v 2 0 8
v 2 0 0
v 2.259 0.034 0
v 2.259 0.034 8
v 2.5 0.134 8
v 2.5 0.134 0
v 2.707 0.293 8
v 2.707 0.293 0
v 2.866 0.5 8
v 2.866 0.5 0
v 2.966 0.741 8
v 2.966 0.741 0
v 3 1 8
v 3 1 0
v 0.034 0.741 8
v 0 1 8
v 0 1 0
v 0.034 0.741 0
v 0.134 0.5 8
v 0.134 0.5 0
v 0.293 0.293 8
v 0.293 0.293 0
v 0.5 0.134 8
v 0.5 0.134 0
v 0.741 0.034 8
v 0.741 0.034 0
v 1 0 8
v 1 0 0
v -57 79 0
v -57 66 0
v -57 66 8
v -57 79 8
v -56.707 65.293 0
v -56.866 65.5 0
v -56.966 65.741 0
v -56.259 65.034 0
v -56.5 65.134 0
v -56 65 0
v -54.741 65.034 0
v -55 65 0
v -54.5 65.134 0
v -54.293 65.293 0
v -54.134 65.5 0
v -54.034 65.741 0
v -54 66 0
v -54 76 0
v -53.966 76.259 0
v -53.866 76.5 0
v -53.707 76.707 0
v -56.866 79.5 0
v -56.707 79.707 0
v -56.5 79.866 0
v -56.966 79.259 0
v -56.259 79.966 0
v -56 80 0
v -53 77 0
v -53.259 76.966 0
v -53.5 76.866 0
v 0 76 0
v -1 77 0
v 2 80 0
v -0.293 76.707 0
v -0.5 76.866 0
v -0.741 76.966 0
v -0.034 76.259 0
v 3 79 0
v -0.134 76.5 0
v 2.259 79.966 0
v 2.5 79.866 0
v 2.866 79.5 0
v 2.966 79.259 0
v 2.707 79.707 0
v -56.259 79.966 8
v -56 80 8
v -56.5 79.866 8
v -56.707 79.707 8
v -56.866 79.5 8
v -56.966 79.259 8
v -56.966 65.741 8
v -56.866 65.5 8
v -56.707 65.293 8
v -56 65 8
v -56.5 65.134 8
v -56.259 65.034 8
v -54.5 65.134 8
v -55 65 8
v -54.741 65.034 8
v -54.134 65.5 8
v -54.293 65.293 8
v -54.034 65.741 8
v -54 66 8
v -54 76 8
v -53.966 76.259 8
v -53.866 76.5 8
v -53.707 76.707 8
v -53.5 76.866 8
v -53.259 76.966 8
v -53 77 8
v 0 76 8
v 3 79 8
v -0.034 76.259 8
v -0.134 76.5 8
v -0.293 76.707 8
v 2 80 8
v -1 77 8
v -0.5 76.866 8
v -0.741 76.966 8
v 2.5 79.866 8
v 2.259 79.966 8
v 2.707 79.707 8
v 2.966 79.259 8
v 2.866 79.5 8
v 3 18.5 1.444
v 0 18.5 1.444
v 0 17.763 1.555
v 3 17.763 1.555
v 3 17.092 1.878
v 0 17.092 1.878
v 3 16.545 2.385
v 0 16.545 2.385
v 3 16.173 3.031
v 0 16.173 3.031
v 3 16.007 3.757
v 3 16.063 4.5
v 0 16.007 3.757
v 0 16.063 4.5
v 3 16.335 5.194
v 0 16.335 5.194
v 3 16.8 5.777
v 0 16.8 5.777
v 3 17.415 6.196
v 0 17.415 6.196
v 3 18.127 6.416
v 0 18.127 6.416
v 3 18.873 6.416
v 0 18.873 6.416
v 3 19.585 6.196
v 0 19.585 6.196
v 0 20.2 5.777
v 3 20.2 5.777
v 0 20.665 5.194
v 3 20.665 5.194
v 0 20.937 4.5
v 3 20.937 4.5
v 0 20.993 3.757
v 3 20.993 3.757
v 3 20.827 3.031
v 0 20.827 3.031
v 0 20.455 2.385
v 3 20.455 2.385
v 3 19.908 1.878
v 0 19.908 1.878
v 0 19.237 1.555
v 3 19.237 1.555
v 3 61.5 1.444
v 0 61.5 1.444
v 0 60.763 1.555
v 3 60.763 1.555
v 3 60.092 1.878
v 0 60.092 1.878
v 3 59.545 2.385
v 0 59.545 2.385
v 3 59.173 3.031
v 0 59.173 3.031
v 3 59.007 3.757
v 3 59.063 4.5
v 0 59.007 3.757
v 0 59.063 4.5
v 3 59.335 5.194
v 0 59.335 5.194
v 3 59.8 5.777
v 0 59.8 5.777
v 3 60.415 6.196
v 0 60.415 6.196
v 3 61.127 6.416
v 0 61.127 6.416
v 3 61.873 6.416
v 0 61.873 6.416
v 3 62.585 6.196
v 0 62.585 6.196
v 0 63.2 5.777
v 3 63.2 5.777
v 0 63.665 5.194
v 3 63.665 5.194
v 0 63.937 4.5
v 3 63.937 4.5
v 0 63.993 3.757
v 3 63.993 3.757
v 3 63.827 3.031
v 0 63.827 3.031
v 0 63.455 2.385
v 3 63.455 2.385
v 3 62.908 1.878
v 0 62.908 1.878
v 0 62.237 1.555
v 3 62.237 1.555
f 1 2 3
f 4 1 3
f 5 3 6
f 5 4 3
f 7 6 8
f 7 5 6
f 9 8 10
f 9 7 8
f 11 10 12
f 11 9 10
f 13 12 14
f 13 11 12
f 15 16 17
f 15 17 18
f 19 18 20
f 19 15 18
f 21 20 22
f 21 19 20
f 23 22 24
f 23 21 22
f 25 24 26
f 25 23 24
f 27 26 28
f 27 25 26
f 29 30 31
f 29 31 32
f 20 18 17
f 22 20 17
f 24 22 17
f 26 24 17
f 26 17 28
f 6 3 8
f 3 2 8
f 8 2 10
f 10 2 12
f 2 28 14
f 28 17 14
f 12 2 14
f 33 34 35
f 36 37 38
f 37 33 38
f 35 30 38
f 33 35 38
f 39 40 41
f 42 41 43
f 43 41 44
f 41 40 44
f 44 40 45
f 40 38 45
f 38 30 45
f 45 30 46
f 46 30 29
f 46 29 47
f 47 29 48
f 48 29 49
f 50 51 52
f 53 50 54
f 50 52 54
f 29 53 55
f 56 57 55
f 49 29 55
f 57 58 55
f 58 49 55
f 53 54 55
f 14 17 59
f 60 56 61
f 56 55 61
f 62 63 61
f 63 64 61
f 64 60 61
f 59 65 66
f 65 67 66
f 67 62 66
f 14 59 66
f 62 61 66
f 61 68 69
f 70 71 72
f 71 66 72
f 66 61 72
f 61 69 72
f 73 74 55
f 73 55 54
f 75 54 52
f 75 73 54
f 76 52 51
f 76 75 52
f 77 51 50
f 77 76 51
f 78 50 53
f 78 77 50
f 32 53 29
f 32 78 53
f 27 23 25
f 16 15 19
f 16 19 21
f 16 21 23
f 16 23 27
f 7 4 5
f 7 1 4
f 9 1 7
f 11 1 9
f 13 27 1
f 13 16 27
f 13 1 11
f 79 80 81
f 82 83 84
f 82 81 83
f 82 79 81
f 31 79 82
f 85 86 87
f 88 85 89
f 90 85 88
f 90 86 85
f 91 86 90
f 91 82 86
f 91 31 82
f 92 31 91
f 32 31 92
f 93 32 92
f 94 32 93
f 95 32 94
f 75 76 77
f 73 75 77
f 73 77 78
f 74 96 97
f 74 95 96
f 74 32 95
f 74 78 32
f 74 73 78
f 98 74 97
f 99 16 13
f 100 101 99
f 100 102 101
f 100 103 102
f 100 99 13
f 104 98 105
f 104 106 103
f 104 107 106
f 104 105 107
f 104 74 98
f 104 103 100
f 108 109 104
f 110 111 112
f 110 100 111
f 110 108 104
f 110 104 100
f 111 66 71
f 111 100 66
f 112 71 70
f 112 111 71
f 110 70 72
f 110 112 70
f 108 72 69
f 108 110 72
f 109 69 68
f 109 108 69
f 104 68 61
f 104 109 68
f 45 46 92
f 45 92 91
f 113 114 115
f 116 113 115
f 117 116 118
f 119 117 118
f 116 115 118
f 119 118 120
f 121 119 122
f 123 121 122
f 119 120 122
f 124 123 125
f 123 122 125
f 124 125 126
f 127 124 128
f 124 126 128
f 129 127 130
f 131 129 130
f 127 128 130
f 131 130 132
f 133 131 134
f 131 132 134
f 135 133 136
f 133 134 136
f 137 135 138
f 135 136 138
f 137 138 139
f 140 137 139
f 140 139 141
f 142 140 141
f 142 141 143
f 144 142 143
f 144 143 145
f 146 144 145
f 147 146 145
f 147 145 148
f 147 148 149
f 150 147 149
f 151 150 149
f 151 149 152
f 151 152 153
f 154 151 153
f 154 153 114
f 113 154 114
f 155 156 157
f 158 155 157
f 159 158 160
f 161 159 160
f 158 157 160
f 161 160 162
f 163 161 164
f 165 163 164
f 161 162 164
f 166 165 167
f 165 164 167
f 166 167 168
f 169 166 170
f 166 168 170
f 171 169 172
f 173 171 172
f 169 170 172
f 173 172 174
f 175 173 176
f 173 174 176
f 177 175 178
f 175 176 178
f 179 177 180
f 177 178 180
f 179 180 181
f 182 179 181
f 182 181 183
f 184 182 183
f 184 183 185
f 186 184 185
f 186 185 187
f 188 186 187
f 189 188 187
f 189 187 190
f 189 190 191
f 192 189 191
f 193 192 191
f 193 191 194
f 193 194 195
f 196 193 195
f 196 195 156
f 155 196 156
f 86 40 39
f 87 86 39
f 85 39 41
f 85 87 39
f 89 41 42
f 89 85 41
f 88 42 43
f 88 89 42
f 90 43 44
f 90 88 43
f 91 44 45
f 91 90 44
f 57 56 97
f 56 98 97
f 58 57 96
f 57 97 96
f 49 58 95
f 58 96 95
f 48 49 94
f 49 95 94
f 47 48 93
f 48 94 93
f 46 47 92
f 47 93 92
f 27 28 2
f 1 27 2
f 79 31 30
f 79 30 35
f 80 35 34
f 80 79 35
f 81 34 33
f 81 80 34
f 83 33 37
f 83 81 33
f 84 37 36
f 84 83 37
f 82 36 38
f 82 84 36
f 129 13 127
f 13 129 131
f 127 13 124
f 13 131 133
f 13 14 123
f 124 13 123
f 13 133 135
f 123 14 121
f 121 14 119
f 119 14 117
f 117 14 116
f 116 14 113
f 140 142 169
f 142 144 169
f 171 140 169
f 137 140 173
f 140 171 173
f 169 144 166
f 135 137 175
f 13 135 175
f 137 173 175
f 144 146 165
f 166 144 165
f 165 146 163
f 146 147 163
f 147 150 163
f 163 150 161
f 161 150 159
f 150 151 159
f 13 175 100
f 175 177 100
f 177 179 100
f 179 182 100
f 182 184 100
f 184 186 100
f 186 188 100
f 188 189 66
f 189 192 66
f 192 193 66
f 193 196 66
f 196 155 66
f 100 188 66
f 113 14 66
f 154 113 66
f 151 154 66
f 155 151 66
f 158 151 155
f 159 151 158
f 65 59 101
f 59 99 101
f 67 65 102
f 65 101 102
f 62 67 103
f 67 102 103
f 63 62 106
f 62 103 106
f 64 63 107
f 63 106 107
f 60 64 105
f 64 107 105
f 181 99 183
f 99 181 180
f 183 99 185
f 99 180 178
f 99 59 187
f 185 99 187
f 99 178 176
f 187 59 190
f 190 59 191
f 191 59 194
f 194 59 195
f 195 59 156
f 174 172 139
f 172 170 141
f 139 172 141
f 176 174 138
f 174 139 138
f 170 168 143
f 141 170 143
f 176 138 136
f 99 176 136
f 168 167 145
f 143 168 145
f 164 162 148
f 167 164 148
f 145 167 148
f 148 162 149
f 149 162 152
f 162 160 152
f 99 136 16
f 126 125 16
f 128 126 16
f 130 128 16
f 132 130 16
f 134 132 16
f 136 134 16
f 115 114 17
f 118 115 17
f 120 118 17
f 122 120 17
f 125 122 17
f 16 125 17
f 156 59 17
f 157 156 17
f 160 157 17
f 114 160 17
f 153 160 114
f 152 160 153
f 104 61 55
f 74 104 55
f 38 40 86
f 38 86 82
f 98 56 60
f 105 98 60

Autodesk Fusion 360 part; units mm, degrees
sketch "Sketch1" plane through (0, 0, 0) normal (0, 0, 1) x (1, 0, 0)
  line L0 (0, 0) -> (3, 0)
  line L1 (3, 0) -> (3, 80)
  line L2 (3, 80) -> (0, 80)
  line L3 (0, 77) -> (0, 0)
  line L4 (0, 80) -> (-57, 80)
  line L5 (-57, 80) -> (-57, 77)
  line L6 (-54, 77) -> (0, 77)
  line L7 (-54, 77) -> (-54, 65)
  line L8 (-54, 65) -> (-57, 65)
  line L9 (-57, 65) -> (-57, 77)
  dimension "d1" = 80
  dimension "d2" = 3
  dimension "d3" = 60
  dimension "d4" = 3
  dimension "d5" = 15
  dimension "d6" = 3
extrude "Extrude1" add sketch "Sketch1" along normal blind 8
fillet "Fillet1" radius 1 8 edges at (0, 77, 4) (-54, 77, 4) (-54, 65, 4) (-57, 65, 4) (-57, 80, 4) (3, 80, 4) (3, 0, 4) (0, 0, 4)
sketch "Sketch2" plane through (3, 0, 0) normal (1, 0, 0) x (0, 1, 0)
  line L0 (1, 8) -> (1, 0)
  line L1 (1, 0) -> (79, 0)
  line L2 (79, 0) -> (79, 8)
  line L3 (79, 8) -> (1, 8)
  line L4 (80, 0) -> (80, 8)
  point P0 (61.5, 3.944)
  point P1 (18.5, 3.944)
  dimension "d11" = 43
  dimension "d12" = 18.5
hole "Hole1" at (3, 61.5, 3.944) at (3, 18.5, 3.944) direction (-1, 0, 0) diameter 5 depth 3 tip angle 118
equation "d12 = ( ( 80 - 43 ) / 2 ) * 1 mm"
